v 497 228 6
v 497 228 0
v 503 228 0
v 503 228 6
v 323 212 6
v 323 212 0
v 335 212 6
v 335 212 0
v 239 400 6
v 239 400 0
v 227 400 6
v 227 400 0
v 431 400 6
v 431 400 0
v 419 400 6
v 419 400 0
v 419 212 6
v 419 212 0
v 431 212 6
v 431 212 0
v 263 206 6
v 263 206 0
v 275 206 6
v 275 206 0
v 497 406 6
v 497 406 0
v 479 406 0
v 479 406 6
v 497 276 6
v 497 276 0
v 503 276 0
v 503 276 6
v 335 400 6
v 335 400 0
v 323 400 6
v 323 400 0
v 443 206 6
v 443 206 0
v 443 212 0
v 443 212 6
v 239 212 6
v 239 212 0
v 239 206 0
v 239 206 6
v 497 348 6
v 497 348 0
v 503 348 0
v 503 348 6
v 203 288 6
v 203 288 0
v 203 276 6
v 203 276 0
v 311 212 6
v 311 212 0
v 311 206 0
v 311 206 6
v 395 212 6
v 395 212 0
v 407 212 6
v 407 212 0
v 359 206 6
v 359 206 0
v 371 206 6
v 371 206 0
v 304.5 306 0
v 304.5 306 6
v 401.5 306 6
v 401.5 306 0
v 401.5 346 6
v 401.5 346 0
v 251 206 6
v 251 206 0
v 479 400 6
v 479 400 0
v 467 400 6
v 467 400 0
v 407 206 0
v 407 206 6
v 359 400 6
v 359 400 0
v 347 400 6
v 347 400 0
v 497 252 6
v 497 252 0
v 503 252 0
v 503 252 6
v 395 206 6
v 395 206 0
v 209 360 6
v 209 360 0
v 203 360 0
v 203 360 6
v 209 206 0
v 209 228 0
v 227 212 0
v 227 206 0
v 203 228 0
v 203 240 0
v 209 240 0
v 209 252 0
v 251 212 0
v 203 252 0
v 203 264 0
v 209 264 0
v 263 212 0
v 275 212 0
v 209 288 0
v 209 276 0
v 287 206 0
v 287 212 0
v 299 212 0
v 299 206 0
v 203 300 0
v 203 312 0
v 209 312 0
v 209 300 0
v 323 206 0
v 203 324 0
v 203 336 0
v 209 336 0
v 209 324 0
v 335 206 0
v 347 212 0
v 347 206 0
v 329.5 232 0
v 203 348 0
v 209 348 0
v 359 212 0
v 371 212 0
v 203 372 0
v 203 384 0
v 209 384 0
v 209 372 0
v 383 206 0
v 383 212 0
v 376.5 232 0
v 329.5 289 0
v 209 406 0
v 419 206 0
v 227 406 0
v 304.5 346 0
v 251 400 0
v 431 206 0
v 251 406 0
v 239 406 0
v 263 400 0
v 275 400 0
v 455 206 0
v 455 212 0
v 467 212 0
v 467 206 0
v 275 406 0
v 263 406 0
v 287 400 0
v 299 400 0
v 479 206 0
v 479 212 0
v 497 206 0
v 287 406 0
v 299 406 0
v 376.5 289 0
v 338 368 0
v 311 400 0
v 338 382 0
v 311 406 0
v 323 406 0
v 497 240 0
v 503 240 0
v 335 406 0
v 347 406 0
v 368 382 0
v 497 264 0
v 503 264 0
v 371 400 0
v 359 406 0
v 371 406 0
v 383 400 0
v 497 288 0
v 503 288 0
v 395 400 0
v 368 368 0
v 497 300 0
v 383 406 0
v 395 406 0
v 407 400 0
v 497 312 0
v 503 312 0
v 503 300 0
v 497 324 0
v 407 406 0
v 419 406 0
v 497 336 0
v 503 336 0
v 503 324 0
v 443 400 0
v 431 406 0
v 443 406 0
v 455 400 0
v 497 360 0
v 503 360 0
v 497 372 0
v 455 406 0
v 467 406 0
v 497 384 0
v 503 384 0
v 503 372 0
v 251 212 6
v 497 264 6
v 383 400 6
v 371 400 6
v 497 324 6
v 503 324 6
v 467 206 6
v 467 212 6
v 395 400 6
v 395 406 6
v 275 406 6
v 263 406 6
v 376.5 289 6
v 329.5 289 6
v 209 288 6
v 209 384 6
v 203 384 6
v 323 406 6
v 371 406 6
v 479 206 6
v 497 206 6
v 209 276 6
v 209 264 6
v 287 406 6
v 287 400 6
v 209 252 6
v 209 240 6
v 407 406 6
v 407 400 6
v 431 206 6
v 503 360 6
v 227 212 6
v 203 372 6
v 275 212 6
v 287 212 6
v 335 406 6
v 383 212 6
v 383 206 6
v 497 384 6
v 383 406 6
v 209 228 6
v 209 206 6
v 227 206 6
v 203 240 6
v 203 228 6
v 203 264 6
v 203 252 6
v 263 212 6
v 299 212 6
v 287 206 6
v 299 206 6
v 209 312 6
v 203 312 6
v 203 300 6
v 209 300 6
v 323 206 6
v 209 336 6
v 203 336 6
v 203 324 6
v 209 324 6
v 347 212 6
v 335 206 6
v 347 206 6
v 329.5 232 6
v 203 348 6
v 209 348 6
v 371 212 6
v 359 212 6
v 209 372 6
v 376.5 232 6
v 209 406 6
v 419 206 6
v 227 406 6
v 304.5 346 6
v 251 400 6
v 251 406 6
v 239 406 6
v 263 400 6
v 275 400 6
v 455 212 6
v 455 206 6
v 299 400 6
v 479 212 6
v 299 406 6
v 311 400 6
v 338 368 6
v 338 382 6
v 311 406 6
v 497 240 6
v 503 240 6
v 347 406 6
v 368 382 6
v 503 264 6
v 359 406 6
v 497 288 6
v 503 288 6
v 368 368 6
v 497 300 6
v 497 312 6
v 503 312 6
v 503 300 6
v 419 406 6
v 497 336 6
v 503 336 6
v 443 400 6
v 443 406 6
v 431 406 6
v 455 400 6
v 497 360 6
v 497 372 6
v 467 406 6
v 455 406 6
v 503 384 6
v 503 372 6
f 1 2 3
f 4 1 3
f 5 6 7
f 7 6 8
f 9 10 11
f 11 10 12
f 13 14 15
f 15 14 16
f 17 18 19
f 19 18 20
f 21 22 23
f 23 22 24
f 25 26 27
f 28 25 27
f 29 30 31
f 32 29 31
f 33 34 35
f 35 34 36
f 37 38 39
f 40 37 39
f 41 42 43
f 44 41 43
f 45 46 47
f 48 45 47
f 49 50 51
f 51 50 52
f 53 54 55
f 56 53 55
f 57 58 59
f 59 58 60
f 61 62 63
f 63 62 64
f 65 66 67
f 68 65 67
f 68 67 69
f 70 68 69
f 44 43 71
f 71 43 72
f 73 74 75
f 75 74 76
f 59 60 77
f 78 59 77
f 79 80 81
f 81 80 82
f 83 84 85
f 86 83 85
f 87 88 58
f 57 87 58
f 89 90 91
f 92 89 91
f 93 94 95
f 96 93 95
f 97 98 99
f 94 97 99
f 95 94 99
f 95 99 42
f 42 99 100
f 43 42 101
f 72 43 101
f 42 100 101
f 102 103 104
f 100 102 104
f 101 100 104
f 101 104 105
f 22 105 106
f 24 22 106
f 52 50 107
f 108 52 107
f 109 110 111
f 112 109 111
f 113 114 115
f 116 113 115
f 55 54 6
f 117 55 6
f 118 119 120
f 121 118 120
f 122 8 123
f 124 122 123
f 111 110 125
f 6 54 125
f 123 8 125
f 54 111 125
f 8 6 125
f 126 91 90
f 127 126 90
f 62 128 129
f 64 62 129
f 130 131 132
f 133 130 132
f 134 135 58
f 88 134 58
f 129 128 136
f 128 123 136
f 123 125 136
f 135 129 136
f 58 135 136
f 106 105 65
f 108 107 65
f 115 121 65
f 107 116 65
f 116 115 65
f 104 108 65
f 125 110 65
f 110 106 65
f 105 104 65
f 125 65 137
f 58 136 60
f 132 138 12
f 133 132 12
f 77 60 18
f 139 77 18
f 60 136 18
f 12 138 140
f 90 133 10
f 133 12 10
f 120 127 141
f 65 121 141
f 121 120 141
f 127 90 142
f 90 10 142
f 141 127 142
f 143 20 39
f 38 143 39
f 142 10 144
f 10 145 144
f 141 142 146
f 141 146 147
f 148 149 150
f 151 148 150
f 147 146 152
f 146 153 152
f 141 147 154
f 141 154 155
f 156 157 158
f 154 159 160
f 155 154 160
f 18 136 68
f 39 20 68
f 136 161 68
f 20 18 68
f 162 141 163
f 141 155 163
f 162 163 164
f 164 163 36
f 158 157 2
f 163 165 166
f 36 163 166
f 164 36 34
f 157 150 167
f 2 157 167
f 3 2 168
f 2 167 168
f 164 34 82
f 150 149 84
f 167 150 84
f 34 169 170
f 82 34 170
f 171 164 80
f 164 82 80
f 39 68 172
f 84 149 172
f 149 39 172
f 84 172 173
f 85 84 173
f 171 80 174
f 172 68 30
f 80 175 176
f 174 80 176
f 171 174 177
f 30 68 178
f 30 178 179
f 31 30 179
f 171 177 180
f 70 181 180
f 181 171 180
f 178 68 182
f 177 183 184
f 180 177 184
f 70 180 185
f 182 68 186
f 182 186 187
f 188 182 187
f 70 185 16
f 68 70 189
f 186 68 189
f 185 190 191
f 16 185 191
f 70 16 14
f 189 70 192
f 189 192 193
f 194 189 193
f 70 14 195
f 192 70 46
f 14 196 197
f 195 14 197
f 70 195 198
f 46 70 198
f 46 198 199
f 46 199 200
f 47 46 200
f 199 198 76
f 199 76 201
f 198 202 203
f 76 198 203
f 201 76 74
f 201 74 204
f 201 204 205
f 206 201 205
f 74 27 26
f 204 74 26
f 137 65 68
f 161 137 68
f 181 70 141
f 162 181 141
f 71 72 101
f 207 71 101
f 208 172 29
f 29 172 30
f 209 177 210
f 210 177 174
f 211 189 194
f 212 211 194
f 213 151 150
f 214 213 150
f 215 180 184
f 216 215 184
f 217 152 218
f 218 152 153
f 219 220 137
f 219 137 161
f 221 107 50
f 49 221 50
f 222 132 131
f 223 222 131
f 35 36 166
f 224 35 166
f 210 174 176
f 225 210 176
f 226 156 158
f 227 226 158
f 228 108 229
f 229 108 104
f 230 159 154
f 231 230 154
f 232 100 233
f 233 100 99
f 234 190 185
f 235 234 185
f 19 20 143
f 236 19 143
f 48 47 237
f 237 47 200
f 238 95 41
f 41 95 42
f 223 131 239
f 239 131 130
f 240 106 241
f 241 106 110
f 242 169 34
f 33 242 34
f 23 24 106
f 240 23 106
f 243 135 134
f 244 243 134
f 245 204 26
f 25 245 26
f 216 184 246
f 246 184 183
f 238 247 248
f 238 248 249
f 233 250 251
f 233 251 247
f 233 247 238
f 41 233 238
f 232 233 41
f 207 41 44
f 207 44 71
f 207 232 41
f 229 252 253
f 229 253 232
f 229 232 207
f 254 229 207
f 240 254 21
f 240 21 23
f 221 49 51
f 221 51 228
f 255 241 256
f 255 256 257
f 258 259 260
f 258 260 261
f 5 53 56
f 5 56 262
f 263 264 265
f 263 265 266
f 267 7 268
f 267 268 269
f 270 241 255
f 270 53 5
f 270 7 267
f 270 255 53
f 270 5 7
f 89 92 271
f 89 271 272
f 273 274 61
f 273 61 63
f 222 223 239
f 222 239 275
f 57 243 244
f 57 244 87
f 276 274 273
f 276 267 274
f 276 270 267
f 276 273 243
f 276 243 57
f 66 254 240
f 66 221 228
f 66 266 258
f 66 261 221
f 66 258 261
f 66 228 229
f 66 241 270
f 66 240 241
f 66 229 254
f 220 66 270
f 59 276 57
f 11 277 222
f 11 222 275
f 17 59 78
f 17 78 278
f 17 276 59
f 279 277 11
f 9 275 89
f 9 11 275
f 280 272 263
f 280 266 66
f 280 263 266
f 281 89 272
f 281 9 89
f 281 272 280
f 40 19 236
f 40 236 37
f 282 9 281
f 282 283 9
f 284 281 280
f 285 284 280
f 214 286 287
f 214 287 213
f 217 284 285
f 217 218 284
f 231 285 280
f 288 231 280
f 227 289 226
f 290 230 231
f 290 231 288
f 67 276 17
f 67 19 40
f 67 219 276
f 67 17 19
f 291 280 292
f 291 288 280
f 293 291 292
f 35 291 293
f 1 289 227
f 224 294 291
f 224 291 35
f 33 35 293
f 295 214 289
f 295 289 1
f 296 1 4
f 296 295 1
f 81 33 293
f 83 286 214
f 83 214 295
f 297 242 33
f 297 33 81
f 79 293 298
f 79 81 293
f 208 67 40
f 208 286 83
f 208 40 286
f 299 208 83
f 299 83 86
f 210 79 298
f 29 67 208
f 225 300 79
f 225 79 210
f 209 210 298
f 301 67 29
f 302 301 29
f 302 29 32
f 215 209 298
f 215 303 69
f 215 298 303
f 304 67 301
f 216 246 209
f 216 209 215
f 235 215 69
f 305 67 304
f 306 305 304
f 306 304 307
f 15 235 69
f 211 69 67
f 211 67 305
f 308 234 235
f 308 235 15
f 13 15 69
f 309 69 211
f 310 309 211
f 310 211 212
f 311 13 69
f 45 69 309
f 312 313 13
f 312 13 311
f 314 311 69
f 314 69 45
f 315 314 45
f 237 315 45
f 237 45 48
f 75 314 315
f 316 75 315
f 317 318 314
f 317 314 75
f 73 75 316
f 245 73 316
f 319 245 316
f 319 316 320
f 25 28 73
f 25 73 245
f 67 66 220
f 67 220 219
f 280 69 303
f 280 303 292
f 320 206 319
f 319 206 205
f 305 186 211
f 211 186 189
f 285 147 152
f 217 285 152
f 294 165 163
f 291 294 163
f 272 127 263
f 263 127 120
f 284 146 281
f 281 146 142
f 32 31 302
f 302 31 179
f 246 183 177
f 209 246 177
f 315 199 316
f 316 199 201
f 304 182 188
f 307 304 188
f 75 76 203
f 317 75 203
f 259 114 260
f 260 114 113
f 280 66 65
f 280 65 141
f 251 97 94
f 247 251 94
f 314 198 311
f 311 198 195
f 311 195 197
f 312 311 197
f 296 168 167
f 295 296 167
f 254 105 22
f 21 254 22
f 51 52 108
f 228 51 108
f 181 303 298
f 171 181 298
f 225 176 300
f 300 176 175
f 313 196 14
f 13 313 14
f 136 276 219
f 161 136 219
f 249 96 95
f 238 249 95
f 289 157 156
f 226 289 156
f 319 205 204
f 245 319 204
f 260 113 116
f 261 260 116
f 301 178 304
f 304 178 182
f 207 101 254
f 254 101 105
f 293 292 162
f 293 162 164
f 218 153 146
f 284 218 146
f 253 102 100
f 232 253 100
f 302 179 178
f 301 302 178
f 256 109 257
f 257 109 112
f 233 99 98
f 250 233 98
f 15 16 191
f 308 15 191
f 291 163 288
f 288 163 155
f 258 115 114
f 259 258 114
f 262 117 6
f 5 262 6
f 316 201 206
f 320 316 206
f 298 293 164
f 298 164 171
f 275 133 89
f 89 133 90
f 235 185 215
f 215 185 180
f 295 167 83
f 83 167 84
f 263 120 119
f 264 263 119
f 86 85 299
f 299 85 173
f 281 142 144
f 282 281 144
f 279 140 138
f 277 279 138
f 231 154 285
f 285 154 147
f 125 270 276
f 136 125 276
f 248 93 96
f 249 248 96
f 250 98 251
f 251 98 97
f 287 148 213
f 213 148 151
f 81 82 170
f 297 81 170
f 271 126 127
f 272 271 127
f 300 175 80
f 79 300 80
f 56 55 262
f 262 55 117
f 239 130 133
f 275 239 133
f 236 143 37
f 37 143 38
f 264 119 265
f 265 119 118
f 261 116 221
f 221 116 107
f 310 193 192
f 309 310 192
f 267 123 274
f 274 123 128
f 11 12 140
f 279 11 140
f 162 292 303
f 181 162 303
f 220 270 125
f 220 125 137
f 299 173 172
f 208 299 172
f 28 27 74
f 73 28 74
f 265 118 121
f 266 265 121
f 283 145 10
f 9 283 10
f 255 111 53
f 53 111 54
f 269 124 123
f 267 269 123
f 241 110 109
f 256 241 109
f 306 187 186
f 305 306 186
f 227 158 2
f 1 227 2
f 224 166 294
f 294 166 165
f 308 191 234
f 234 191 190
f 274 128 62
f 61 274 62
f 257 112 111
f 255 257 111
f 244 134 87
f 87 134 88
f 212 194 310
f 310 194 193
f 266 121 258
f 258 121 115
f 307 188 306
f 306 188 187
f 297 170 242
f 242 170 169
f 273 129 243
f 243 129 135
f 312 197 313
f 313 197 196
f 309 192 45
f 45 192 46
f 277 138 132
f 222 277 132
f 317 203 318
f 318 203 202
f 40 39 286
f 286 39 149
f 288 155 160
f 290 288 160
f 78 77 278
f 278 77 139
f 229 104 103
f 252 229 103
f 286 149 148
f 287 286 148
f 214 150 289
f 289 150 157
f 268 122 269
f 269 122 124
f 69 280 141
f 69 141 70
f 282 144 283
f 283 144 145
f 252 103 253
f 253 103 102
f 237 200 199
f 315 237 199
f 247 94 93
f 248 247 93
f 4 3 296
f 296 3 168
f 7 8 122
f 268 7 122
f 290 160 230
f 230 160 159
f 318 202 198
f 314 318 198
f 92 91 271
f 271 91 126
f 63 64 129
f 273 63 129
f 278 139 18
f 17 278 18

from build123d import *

# Parameters (mm, degrees)
BOSS_EXTRUDE1_DEPTH = 6
SKETCH2_W           = 30
SKETCH2_H           = 14
SKETCH2_W_2         = 97
SKETCH2_H_2         = 40
SKETCH2_W_3         = 47
SKETCH2_H_3         = 57
CUT_EXTRUDE1_DEPTH  = 6


with BuildPart() as part:
    # Model → Boss-Extrude1 (new body)
    with BuildSketch(Plane.XY):
        Polygon((209, 406), (209, 384), (203, 384), (203, 372), (209, 372), (209, 360), (203, 360), (203, 348), (209, 348), (209, 336), (203, 336), (203, 324), (209, 324), (209, 312), (203, 312), (203, 300), (209, 300), (209, 288), (203, 288), (203, 276), (209, 276), (209, 264), (203, 264), (203, 252), (209, 252), (209, 240), (203, 240), (203, 228), (209, 228), (209, 216), (209, 206), (227, 206), (227, 212), (239, 212), (239, 206), (251, 206), (251, 212), (263, 212), (263, 206), (275, 206), (275, 212), (287, 212), (287, 206), (299, 206), (299, 212), (311, 212), (311, 206), (323, 206), (323, 212), (335, 212), (335, 206), (347, 206), (347, 212), (359, 212), (359, 206), (371, 206), (371, 212), (383, 212), (383, 206), (395, 206), (395, 212), (407, 212), (407, 206), (419, 206), (419, 212), (431, 212), (431, 206), (443, 206), (443, 212), (455, 212), (455, 206), (467, 206), (467, 212), (479, 212), (479, 206), (491, 206), (497, 206), (497, 228), (503, 228), (503, 240), (497, 240), (497, 252), (503, 252), (503, 264), (497, 264), (497, 276), (503, 276), (503, 288), (497, 288), (497, 300), (503, 300), (503, 312), (497, 312), (497, 324), (503, 324), (503, 336), (497, 336), (497, 348), (503, 348), (503, 360), (497, 360), (497, 372), (503, 372), (503, 384), (497, 384), (497, 396), (497, 406), (479, 406), (479, 400), (467, 400), (467, 406), (455, 406), (455, 400), (443, 400), (443, 406), (431, 406), (431, 400), (419, 400), (419, 406), (407, 406), (407, 400), (395, 400), (395, 406), (383, 406), (383, 400), (371, 400), (371, 406), (359, 406), (359, 400), (347, 400), (347, 406), (335, 406), (335, 400), (323, 400), (323, 406), (311, 406), (311, 400), (299, 400), (299, 406), (287, 406), (287, 400), (275, 400), (275, 406), (263, 406), (263, 400), (251, 400), (251, 406), (239, 406), (239, 400), (227, 400), (227, 406), (215, 406), align=None)
    extrude(amount=BOSS_EXTRUDE1_DEPTH)

    # Sketch2 → Cut-Extrude1 (cut)
    with BuildSketch(Plane.XY.offset(6)):
        with Locations((353, 375)):
            Rectangle(SKETCH2_W, SKETCH2_H)
        with Locations((353, 326)):
            Rectangle(SKETCH2_W_2, SKETCH2_H_2)
        with Locations((353, 260.5)):
            Rectangle(SKETCH2_W_3, SKETCH2_H_3)
    extrude(amount=-CUT_EXTRUDE1_DEPTH, mode=Mode.SUBTRACT)


solid = part.part
